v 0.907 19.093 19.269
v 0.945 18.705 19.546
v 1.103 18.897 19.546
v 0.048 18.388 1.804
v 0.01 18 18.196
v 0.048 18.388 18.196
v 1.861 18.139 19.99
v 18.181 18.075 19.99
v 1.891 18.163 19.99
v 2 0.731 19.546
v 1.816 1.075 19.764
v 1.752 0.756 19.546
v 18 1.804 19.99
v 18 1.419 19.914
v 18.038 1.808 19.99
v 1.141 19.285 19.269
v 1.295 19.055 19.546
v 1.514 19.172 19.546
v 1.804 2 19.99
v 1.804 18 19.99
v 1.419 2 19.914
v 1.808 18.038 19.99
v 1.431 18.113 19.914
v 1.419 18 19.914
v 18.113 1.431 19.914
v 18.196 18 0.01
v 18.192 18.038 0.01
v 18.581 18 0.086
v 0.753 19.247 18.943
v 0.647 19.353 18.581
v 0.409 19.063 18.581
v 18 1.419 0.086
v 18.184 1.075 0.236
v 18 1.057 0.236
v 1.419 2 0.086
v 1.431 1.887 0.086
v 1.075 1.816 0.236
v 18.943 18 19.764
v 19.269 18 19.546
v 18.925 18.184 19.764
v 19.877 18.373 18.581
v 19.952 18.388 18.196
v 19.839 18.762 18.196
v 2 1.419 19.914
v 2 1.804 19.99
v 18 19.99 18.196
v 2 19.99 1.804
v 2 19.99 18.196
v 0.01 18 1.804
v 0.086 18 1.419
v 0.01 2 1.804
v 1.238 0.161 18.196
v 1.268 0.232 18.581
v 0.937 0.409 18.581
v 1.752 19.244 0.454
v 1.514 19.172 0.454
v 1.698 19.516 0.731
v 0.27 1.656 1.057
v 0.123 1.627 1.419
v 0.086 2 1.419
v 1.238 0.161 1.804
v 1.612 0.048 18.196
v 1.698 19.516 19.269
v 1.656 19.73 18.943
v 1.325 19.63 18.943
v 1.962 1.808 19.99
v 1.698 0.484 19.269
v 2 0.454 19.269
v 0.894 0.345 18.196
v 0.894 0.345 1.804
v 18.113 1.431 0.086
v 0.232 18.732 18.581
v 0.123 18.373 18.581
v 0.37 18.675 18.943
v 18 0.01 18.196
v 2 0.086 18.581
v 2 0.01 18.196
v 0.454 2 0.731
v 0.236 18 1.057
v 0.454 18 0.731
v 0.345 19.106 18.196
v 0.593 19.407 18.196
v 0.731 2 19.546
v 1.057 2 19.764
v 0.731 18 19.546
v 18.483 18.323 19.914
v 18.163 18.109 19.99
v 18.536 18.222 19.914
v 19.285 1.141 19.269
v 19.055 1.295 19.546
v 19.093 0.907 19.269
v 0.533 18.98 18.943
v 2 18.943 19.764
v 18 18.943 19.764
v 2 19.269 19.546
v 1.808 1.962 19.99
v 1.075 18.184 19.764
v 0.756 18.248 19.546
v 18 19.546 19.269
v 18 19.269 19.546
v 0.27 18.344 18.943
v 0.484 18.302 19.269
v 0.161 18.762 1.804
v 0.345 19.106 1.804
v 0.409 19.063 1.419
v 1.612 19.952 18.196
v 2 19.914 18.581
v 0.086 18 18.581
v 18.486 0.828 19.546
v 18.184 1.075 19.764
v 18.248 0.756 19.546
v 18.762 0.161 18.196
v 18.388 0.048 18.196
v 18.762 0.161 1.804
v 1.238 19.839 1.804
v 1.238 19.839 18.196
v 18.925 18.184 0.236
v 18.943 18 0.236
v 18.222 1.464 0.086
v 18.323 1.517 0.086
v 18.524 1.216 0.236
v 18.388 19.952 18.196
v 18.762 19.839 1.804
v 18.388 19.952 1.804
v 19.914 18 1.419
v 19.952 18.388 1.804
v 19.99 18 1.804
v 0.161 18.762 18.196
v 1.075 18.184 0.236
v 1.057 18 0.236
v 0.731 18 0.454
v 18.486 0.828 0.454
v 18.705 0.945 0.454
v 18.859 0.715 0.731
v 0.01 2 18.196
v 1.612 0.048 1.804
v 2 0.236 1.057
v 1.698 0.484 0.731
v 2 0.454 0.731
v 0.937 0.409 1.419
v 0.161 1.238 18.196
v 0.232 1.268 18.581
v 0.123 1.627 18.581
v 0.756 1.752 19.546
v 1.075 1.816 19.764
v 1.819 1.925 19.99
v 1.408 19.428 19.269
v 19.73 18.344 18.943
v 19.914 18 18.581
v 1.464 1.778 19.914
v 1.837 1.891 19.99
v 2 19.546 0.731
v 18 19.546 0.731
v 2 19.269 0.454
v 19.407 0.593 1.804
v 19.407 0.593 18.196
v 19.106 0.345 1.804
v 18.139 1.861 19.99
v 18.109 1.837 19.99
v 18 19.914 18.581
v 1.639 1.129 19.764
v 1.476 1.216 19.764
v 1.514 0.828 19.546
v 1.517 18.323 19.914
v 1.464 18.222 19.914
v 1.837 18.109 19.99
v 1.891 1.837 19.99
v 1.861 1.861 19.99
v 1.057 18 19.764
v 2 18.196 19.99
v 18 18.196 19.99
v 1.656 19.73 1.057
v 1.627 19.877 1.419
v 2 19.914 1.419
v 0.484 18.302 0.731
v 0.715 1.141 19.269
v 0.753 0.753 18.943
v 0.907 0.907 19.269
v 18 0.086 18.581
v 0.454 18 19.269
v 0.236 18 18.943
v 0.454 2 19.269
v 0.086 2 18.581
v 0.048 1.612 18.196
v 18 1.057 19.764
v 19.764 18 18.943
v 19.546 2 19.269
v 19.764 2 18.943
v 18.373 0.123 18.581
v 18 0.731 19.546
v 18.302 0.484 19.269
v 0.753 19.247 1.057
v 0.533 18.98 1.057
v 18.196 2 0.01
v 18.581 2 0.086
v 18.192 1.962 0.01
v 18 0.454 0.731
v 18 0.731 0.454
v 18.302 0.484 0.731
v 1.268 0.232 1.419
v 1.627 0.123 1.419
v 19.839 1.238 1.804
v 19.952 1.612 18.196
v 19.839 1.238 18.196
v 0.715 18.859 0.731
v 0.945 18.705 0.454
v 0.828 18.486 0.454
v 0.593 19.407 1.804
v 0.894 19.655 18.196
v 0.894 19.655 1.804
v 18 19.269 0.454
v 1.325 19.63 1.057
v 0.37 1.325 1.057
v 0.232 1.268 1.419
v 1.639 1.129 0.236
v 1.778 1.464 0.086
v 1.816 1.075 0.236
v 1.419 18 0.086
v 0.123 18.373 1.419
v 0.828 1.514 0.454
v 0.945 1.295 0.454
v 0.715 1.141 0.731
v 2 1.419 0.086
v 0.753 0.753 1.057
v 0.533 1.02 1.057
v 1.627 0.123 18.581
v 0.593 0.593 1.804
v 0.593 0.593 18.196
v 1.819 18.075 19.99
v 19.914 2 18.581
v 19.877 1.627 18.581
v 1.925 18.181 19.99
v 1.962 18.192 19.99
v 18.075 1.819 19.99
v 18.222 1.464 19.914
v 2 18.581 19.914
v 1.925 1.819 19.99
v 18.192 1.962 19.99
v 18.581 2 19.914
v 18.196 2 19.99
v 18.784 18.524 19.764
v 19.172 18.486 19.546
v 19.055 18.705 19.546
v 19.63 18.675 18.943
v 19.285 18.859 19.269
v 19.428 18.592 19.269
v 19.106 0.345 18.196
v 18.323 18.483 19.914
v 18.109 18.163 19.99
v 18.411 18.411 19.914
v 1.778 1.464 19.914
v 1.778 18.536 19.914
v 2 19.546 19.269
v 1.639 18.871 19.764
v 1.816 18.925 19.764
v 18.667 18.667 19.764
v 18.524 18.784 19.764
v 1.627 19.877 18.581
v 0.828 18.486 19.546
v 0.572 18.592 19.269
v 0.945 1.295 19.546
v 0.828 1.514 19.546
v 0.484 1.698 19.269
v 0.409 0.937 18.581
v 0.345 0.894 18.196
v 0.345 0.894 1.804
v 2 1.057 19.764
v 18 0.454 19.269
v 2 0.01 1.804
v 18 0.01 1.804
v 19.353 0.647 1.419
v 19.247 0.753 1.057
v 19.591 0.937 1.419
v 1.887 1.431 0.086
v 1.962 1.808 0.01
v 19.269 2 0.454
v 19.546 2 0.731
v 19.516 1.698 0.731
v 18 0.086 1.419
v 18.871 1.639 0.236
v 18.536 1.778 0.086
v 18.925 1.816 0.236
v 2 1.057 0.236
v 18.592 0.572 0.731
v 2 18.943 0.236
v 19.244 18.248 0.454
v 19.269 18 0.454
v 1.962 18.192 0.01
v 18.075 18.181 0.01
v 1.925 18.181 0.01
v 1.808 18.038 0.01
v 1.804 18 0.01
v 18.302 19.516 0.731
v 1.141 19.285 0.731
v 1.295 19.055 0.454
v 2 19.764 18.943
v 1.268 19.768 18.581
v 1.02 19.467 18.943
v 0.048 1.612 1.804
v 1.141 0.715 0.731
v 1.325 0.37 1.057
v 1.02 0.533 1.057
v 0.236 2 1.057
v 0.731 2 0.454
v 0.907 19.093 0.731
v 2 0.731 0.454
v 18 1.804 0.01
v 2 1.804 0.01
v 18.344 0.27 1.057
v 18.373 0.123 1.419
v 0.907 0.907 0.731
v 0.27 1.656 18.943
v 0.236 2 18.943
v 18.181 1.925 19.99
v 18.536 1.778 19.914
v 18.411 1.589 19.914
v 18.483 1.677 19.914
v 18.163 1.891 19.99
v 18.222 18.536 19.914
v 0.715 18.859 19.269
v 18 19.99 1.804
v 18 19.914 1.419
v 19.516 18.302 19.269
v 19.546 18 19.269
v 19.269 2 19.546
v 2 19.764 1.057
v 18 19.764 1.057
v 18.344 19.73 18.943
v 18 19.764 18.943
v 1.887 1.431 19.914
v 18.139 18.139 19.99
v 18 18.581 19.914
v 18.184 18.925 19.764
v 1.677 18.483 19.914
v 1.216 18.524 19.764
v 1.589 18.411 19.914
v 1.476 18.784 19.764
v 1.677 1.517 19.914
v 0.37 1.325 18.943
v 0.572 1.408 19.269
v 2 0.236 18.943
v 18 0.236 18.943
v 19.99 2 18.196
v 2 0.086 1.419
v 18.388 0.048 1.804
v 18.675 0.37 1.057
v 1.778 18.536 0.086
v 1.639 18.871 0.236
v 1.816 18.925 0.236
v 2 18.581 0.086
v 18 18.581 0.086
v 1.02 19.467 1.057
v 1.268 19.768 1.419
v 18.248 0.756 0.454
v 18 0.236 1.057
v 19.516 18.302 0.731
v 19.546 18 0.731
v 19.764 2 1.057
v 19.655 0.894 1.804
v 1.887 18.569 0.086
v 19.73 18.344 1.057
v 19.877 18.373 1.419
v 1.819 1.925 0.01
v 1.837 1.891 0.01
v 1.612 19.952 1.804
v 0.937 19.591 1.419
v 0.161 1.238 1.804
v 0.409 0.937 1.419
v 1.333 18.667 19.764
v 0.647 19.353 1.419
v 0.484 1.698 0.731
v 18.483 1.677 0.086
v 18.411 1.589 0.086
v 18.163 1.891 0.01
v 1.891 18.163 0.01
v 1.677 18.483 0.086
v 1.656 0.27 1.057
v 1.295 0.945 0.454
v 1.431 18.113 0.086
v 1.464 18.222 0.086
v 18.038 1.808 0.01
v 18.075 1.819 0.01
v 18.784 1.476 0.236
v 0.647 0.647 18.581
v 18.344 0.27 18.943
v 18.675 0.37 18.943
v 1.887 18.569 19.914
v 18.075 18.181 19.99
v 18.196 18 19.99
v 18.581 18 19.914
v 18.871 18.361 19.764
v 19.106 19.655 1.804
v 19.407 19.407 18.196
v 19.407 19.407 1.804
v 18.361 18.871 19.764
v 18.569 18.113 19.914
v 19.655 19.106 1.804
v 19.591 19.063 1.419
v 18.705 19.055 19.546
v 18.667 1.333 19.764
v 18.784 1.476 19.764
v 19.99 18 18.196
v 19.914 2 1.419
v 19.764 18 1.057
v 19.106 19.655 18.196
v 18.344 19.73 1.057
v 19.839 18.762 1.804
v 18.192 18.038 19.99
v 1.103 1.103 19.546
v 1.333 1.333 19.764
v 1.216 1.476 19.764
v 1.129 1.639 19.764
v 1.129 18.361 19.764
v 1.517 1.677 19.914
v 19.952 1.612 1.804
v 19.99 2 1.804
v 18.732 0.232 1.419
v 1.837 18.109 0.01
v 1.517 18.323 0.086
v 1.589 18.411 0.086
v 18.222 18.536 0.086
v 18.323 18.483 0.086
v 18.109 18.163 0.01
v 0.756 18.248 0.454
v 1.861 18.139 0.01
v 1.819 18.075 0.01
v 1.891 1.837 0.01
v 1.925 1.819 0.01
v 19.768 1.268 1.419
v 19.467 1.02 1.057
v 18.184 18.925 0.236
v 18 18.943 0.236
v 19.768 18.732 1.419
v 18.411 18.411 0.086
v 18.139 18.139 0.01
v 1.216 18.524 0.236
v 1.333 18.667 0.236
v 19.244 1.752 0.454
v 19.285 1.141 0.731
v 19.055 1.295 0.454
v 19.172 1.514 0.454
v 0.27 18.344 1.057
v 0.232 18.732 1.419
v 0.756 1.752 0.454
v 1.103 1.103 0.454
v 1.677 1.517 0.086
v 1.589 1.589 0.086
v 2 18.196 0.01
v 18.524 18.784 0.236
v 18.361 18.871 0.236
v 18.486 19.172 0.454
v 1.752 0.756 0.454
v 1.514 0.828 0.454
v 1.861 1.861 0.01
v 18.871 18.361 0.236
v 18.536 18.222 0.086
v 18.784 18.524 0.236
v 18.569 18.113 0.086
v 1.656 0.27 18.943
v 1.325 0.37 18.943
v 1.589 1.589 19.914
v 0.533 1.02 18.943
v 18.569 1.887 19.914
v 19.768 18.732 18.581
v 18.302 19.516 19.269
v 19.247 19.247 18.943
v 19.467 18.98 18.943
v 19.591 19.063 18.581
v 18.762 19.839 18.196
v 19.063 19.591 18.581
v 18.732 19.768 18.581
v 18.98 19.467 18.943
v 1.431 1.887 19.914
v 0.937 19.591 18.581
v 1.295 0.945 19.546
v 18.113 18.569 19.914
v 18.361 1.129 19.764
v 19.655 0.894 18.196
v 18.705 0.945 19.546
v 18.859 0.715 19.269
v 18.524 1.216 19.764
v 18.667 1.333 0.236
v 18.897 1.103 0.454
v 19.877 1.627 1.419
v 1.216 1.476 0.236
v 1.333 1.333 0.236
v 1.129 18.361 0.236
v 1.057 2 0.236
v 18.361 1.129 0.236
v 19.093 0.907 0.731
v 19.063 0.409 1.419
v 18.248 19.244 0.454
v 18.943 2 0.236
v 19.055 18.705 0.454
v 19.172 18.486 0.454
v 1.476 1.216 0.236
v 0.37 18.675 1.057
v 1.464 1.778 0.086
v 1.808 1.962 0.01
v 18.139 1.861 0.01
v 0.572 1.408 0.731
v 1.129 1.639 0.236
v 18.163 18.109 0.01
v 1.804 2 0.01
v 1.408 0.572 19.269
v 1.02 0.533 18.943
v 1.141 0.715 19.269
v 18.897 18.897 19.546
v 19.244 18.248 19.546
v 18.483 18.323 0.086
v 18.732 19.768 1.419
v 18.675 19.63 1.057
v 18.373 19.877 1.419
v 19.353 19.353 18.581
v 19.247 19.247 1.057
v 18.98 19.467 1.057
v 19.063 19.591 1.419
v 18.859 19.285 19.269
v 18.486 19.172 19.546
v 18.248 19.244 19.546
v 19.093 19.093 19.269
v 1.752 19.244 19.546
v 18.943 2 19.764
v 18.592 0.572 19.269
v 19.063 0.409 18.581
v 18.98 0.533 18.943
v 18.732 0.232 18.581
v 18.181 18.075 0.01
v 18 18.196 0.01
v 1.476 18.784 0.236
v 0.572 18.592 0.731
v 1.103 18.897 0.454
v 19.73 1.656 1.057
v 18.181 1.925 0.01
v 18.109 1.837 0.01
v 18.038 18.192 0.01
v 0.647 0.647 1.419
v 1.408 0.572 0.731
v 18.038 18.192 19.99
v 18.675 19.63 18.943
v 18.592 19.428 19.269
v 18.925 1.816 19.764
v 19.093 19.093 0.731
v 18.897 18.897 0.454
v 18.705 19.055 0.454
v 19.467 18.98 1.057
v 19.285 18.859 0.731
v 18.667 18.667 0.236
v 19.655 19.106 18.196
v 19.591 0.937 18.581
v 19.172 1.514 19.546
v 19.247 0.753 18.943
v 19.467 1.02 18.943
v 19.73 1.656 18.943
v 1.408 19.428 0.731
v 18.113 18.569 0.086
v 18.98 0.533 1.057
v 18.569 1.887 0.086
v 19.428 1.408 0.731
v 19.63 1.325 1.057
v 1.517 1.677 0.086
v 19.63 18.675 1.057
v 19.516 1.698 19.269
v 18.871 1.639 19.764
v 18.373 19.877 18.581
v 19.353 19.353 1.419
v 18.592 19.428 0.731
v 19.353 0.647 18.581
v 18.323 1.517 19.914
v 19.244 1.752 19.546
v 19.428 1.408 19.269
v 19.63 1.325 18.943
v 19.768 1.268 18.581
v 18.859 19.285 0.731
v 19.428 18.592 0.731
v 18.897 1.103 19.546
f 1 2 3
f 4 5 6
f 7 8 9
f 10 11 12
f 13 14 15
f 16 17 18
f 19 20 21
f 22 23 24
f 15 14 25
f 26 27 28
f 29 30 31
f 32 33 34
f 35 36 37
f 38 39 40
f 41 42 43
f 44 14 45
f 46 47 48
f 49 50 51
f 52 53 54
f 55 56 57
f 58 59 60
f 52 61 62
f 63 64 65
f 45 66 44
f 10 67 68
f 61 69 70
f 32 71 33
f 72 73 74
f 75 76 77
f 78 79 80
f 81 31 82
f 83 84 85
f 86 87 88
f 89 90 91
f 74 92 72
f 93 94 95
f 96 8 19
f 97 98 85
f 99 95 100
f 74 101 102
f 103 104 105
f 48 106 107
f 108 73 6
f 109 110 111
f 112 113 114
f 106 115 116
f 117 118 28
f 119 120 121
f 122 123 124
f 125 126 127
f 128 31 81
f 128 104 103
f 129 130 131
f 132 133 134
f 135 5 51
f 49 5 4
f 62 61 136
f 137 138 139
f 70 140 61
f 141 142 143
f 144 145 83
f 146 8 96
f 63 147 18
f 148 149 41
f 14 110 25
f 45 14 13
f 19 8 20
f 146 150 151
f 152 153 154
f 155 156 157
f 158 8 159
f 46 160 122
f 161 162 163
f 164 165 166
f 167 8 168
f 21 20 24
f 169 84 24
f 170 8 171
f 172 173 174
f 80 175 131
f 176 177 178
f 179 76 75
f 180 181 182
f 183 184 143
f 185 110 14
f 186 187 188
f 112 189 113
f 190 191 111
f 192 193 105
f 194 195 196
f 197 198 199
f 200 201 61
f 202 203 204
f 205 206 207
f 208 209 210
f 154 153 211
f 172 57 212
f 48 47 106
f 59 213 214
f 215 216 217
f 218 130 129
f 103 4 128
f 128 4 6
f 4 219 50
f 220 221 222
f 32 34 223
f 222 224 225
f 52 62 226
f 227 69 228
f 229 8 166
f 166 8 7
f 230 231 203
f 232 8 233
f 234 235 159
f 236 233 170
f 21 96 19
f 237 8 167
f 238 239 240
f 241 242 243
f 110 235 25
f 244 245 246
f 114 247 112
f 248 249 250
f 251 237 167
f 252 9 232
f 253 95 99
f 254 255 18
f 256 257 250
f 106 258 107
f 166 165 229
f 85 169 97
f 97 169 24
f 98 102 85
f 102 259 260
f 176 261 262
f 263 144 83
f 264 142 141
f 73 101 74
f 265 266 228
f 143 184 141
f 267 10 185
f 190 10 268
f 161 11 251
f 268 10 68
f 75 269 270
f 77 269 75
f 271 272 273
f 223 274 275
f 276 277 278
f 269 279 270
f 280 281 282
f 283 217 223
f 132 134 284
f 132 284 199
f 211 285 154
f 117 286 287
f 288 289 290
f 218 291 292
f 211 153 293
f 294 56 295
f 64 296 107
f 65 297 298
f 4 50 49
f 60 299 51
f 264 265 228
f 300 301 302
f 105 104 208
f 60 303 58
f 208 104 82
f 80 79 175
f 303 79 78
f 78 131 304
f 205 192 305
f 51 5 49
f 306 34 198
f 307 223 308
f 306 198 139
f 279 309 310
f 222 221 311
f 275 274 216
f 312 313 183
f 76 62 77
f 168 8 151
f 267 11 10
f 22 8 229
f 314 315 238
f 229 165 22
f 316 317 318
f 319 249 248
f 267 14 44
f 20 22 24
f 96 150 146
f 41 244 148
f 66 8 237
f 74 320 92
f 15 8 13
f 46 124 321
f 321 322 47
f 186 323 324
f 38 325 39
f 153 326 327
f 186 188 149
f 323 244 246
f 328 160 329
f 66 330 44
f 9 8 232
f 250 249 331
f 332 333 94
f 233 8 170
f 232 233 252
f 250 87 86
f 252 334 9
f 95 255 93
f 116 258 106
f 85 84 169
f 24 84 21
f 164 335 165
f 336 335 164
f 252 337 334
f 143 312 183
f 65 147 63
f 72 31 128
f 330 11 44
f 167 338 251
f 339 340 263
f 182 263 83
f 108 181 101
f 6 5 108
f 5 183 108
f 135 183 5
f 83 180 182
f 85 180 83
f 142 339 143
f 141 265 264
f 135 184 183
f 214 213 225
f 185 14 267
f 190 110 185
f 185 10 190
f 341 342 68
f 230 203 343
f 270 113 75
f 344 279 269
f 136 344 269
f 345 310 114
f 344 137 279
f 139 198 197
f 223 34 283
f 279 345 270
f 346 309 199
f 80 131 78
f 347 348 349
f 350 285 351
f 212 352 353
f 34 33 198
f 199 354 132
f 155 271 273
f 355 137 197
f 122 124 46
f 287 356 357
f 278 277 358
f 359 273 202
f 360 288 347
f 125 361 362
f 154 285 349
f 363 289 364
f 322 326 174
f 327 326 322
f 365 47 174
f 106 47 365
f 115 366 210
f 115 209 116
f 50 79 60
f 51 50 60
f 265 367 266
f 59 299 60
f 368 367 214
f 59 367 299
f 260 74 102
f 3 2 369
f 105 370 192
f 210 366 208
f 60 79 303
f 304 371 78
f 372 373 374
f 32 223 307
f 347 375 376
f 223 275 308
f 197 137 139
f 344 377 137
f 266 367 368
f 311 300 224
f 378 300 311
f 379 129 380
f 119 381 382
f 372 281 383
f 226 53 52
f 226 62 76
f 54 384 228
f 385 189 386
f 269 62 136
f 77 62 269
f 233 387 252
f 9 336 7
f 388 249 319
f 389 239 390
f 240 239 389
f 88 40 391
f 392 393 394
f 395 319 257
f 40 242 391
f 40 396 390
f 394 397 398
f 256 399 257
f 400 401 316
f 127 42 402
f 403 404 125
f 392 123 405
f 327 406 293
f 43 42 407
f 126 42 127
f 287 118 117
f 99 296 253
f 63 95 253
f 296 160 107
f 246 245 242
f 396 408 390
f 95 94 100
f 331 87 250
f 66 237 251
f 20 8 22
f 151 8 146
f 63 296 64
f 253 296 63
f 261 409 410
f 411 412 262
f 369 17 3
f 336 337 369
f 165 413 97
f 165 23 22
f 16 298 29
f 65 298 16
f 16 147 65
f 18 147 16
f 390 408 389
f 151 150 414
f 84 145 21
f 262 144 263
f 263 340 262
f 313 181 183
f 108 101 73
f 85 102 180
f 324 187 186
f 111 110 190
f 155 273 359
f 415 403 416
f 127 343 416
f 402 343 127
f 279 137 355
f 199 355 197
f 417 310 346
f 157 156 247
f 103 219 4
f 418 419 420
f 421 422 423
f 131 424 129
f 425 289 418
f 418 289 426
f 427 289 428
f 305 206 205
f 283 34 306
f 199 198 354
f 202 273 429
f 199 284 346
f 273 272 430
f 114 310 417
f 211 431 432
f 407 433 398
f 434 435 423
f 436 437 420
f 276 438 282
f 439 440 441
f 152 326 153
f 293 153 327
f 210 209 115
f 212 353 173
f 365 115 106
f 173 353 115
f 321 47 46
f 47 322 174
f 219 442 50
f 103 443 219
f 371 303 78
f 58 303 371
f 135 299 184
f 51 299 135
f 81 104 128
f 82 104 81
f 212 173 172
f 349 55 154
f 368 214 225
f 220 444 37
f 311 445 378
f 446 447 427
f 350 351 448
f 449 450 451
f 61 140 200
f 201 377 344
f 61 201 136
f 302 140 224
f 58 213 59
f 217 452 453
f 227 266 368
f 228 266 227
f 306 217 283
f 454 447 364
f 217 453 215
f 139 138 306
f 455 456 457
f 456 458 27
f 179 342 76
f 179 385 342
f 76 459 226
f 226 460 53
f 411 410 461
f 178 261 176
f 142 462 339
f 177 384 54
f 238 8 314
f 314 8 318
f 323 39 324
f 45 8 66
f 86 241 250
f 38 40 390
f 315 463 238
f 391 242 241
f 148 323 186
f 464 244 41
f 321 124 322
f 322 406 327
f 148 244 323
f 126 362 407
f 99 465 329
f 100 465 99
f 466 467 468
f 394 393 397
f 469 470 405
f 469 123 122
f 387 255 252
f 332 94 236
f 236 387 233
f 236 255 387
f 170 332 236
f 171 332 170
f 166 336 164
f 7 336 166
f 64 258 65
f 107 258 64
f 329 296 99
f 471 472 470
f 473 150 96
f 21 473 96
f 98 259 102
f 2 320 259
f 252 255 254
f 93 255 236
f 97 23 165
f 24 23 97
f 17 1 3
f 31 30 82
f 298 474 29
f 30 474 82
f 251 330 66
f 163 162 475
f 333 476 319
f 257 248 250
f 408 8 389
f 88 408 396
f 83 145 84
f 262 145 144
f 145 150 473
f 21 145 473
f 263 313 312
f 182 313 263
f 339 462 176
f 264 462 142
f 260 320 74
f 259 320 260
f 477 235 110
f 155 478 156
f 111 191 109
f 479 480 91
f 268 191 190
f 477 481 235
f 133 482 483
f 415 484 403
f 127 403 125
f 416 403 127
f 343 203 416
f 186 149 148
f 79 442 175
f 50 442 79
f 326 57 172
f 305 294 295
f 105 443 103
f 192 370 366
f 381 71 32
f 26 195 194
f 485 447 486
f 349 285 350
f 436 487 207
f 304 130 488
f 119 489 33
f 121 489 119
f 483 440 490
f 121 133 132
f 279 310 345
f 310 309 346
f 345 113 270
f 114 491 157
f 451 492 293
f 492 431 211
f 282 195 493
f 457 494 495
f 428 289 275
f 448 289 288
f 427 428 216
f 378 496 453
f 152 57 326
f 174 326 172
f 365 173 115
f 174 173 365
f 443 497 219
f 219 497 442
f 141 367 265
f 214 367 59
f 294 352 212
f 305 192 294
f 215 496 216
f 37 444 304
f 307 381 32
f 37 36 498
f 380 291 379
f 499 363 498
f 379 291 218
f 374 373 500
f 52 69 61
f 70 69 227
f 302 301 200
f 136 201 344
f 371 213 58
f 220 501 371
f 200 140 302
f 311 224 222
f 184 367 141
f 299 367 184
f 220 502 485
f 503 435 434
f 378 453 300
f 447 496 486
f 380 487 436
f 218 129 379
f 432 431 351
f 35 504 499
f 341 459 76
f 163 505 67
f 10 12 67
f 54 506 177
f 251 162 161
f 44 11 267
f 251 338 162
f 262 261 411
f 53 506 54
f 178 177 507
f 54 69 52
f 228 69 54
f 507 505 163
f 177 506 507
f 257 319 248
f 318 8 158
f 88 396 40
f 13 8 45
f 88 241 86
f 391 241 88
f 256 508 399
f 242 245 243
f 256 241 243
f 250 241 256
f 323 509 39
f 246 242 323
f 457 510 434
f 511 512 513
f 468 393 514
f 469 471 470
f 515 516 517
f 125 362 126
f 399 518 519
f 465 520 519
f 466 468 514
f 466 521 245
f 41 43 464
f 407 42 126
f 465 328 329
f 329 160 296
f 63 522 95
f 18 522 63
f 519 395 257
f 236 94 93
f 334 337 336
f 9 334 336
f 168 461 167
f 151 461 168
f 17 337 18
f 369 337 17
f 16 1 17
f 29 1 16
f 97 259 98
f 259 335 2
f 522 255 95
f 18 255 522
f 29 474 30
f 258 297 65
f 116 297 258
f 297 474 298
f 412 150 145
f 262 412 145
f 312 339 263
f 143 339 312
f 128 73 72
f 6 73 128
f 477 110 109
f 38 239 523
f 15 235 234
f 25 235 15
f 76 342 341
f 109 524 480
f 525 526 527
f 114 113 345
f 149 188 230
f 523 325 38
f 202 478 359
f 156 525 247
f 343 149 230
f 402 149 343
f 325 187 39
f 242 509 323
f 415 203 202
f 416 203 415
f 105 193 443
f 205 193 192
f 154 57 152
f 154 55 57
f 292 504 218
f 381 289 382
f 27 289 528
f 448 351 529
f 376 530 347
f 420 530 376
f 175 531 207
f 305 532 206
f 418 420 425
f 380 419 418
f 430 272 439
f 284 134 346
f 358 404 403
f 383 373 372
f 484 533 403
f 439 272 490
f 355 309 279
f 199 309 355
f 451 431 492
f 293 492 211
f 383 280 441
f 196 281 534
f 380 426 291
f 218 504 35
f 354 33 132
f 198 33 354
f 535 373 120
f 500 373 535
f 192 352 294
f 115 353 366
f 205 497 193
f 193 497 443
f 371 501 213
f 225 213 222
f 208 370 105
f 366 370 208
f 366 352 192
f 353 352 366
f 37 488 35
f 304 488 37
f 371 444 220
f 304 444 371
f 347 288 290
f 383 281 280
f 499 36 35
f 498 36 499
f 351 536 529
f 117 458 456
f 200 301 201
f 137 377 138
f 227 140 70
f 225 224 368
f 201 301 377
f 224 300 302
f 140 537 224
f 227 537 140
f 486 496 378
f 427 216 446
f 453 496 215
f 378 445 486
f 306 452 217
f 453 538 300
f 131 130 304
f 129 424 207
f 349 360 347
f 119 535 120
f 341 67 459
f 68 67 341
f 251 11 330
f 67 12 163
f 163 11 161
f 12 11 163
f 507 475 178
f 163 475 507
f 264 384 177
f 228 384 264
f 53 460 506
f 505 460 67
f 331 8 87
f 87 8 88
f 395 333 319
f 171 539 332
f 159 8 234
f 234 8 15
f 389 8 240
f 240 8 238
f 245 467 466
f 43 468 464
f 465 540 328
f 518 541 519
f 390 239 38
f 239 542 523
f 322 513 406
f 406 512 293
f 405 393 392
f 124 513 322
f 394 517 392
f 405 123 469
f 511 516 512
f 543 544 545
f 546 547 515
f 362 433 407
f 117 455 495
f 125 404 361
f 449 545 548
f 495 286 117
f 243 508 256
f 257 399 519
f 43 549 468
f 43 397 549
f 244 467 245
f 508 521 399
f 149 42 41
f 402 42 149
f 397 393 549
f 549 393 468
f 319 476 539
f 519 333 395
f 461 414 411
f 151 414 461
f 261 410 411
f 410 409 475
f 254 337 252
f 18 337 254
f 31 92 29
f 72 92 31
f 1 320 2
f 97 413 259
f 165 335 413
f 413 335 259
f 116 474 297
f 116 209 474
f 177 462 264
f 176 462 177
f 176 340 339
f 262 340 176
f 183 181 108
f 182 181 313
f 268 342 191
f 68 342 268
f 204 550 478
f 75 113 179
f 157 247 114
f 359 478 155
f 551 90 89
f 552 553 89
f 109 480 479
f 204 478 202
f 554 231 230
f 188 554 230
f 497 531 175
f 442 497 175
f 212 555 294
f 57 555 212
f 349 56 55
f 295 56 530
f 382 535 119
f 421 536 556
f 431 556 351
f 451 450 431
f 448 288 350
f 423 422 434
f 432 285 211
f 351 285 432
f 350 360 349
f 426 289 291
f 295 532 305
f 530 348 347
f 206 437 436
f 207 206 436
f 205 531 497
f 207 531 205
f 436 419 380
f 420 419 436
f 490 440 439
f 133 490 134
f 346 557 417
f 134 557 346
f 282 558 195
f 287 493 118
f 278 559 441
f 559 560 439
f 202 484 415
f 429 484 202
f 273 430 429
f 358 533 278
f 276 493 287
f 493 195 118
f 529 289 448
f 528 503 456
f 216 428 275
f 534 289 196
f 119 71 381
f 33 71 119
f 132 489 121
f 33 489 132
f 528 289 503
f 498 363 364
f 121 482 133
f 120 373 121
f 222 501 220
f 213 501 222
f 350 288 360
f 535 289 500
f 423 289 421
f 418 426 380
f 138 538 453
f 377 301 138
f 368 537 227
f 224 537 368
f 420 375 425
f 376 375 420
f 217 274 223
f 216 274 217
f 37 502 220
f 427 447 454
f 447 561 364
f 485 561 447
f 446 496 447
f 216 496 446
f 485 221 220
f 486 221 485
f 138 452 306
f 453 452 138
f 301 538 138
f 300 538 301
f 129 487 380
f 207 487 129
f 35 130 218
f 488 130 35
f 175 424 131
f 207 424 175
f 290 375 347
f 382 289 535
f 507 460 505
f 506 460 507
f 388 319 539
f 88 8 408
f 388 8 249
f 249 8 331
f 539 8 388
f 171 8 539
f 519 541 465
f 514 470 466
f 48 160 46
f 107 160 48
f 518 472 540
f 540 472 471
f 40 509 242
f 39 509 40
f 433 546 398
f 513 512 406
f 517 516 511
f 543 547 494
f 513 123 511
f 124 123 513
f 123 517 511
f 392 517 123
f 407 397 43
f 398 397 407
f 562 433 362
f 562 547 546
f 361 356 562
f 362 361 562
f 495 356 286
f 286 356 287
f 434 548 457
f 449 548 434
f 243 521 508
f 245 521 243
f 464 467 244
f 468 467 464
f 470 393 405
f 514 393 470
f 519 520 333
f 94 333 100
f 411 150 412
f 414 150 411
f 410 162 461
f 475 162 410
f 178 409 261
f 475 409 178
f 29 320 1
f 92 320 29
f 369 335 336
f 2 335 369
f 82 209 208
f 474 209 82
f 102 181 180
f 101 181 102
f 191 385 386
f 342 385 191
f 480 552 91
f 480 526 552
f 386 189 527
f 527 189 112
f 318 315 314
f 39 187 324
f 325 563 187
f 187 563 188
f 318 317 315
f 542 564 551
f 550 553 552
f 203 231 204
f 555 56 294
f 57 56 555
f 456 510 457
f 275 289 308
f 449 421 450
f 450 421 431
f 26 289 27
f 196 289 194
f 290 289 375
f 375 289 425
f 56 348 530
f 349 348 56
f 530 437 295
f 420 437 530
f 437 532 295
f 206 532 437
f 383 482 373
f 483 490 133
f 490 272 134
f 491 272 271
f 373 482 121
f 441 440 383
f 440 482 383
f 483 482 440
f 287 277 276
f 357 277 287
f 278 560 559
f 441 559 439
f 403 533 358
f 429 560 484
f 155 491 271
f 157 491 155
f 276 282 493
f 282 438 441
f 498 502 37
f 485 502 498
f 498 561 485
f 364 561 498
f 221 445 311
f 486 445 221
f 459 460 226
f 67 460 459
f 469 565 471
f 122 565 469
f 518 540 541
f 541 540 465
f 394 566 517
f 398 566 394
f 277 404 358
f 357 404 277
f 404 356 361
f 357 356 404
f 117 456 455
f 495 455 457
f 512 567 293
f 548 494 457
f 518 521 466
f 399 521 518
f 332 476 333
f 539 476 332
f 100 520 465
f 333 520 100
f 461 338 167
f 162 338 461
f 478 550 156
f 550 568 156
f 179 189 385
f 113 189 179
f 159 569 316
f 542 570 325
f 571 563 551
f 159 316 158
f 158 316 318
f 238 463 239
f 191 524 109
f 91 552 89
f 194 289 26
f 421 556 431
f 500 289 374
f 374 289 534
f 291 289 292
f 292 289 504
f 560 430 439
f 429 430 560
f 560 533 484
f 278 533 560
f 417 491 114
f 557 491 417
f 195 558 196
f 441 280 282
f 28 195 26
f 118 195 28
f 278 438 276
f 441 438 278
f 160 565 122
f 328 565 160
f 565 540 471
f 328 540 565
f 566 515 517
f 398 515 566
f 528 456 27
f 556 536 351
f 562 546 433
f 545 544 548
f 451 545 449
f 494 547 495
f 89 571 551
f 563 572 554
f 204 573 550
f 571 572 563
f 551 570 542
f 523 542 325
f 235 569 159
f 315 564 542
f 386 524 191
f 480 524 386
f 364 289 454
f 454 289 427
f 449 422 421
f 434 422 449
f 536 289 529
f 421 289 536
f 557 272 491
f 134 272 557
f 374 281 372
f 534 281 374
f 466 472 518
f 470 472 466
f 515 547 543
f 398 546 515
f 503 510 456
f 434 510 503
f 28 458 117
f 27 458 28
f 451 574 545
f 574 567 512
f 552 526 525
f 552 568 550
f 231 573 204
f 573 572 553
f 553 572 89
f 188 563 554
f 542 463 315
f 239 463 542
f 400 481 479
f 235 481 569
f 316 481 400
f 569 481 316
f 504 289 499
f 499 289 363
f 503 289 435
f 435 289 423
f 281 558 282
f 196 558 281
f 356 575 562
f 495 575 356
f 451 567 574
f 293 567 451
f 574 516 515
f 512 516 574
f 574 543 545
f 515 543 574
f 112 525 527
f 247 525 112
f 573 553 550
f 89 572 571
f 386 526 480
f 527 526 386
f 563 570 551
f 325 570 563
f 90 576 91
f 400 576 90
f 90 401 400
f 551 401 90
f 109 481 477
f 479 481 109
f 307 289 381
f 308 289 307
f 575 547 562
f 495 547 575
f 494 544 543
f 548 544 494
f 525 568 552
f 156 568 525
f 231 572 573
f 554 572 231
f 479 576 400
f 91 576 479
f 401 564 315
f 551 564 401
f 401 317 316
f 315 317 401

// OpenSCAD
// Technischer Testdurchstich: prüft, ob SCAD-Dateien korrekt erstellt werden
// und sich im VS-Code-Preview rendern lassen.

r = 2;

translate([10, 10, 10])
minkowski() {
    cube(20 - 2 * r, center = true);
    sphere(r, $fn = 32);
}
